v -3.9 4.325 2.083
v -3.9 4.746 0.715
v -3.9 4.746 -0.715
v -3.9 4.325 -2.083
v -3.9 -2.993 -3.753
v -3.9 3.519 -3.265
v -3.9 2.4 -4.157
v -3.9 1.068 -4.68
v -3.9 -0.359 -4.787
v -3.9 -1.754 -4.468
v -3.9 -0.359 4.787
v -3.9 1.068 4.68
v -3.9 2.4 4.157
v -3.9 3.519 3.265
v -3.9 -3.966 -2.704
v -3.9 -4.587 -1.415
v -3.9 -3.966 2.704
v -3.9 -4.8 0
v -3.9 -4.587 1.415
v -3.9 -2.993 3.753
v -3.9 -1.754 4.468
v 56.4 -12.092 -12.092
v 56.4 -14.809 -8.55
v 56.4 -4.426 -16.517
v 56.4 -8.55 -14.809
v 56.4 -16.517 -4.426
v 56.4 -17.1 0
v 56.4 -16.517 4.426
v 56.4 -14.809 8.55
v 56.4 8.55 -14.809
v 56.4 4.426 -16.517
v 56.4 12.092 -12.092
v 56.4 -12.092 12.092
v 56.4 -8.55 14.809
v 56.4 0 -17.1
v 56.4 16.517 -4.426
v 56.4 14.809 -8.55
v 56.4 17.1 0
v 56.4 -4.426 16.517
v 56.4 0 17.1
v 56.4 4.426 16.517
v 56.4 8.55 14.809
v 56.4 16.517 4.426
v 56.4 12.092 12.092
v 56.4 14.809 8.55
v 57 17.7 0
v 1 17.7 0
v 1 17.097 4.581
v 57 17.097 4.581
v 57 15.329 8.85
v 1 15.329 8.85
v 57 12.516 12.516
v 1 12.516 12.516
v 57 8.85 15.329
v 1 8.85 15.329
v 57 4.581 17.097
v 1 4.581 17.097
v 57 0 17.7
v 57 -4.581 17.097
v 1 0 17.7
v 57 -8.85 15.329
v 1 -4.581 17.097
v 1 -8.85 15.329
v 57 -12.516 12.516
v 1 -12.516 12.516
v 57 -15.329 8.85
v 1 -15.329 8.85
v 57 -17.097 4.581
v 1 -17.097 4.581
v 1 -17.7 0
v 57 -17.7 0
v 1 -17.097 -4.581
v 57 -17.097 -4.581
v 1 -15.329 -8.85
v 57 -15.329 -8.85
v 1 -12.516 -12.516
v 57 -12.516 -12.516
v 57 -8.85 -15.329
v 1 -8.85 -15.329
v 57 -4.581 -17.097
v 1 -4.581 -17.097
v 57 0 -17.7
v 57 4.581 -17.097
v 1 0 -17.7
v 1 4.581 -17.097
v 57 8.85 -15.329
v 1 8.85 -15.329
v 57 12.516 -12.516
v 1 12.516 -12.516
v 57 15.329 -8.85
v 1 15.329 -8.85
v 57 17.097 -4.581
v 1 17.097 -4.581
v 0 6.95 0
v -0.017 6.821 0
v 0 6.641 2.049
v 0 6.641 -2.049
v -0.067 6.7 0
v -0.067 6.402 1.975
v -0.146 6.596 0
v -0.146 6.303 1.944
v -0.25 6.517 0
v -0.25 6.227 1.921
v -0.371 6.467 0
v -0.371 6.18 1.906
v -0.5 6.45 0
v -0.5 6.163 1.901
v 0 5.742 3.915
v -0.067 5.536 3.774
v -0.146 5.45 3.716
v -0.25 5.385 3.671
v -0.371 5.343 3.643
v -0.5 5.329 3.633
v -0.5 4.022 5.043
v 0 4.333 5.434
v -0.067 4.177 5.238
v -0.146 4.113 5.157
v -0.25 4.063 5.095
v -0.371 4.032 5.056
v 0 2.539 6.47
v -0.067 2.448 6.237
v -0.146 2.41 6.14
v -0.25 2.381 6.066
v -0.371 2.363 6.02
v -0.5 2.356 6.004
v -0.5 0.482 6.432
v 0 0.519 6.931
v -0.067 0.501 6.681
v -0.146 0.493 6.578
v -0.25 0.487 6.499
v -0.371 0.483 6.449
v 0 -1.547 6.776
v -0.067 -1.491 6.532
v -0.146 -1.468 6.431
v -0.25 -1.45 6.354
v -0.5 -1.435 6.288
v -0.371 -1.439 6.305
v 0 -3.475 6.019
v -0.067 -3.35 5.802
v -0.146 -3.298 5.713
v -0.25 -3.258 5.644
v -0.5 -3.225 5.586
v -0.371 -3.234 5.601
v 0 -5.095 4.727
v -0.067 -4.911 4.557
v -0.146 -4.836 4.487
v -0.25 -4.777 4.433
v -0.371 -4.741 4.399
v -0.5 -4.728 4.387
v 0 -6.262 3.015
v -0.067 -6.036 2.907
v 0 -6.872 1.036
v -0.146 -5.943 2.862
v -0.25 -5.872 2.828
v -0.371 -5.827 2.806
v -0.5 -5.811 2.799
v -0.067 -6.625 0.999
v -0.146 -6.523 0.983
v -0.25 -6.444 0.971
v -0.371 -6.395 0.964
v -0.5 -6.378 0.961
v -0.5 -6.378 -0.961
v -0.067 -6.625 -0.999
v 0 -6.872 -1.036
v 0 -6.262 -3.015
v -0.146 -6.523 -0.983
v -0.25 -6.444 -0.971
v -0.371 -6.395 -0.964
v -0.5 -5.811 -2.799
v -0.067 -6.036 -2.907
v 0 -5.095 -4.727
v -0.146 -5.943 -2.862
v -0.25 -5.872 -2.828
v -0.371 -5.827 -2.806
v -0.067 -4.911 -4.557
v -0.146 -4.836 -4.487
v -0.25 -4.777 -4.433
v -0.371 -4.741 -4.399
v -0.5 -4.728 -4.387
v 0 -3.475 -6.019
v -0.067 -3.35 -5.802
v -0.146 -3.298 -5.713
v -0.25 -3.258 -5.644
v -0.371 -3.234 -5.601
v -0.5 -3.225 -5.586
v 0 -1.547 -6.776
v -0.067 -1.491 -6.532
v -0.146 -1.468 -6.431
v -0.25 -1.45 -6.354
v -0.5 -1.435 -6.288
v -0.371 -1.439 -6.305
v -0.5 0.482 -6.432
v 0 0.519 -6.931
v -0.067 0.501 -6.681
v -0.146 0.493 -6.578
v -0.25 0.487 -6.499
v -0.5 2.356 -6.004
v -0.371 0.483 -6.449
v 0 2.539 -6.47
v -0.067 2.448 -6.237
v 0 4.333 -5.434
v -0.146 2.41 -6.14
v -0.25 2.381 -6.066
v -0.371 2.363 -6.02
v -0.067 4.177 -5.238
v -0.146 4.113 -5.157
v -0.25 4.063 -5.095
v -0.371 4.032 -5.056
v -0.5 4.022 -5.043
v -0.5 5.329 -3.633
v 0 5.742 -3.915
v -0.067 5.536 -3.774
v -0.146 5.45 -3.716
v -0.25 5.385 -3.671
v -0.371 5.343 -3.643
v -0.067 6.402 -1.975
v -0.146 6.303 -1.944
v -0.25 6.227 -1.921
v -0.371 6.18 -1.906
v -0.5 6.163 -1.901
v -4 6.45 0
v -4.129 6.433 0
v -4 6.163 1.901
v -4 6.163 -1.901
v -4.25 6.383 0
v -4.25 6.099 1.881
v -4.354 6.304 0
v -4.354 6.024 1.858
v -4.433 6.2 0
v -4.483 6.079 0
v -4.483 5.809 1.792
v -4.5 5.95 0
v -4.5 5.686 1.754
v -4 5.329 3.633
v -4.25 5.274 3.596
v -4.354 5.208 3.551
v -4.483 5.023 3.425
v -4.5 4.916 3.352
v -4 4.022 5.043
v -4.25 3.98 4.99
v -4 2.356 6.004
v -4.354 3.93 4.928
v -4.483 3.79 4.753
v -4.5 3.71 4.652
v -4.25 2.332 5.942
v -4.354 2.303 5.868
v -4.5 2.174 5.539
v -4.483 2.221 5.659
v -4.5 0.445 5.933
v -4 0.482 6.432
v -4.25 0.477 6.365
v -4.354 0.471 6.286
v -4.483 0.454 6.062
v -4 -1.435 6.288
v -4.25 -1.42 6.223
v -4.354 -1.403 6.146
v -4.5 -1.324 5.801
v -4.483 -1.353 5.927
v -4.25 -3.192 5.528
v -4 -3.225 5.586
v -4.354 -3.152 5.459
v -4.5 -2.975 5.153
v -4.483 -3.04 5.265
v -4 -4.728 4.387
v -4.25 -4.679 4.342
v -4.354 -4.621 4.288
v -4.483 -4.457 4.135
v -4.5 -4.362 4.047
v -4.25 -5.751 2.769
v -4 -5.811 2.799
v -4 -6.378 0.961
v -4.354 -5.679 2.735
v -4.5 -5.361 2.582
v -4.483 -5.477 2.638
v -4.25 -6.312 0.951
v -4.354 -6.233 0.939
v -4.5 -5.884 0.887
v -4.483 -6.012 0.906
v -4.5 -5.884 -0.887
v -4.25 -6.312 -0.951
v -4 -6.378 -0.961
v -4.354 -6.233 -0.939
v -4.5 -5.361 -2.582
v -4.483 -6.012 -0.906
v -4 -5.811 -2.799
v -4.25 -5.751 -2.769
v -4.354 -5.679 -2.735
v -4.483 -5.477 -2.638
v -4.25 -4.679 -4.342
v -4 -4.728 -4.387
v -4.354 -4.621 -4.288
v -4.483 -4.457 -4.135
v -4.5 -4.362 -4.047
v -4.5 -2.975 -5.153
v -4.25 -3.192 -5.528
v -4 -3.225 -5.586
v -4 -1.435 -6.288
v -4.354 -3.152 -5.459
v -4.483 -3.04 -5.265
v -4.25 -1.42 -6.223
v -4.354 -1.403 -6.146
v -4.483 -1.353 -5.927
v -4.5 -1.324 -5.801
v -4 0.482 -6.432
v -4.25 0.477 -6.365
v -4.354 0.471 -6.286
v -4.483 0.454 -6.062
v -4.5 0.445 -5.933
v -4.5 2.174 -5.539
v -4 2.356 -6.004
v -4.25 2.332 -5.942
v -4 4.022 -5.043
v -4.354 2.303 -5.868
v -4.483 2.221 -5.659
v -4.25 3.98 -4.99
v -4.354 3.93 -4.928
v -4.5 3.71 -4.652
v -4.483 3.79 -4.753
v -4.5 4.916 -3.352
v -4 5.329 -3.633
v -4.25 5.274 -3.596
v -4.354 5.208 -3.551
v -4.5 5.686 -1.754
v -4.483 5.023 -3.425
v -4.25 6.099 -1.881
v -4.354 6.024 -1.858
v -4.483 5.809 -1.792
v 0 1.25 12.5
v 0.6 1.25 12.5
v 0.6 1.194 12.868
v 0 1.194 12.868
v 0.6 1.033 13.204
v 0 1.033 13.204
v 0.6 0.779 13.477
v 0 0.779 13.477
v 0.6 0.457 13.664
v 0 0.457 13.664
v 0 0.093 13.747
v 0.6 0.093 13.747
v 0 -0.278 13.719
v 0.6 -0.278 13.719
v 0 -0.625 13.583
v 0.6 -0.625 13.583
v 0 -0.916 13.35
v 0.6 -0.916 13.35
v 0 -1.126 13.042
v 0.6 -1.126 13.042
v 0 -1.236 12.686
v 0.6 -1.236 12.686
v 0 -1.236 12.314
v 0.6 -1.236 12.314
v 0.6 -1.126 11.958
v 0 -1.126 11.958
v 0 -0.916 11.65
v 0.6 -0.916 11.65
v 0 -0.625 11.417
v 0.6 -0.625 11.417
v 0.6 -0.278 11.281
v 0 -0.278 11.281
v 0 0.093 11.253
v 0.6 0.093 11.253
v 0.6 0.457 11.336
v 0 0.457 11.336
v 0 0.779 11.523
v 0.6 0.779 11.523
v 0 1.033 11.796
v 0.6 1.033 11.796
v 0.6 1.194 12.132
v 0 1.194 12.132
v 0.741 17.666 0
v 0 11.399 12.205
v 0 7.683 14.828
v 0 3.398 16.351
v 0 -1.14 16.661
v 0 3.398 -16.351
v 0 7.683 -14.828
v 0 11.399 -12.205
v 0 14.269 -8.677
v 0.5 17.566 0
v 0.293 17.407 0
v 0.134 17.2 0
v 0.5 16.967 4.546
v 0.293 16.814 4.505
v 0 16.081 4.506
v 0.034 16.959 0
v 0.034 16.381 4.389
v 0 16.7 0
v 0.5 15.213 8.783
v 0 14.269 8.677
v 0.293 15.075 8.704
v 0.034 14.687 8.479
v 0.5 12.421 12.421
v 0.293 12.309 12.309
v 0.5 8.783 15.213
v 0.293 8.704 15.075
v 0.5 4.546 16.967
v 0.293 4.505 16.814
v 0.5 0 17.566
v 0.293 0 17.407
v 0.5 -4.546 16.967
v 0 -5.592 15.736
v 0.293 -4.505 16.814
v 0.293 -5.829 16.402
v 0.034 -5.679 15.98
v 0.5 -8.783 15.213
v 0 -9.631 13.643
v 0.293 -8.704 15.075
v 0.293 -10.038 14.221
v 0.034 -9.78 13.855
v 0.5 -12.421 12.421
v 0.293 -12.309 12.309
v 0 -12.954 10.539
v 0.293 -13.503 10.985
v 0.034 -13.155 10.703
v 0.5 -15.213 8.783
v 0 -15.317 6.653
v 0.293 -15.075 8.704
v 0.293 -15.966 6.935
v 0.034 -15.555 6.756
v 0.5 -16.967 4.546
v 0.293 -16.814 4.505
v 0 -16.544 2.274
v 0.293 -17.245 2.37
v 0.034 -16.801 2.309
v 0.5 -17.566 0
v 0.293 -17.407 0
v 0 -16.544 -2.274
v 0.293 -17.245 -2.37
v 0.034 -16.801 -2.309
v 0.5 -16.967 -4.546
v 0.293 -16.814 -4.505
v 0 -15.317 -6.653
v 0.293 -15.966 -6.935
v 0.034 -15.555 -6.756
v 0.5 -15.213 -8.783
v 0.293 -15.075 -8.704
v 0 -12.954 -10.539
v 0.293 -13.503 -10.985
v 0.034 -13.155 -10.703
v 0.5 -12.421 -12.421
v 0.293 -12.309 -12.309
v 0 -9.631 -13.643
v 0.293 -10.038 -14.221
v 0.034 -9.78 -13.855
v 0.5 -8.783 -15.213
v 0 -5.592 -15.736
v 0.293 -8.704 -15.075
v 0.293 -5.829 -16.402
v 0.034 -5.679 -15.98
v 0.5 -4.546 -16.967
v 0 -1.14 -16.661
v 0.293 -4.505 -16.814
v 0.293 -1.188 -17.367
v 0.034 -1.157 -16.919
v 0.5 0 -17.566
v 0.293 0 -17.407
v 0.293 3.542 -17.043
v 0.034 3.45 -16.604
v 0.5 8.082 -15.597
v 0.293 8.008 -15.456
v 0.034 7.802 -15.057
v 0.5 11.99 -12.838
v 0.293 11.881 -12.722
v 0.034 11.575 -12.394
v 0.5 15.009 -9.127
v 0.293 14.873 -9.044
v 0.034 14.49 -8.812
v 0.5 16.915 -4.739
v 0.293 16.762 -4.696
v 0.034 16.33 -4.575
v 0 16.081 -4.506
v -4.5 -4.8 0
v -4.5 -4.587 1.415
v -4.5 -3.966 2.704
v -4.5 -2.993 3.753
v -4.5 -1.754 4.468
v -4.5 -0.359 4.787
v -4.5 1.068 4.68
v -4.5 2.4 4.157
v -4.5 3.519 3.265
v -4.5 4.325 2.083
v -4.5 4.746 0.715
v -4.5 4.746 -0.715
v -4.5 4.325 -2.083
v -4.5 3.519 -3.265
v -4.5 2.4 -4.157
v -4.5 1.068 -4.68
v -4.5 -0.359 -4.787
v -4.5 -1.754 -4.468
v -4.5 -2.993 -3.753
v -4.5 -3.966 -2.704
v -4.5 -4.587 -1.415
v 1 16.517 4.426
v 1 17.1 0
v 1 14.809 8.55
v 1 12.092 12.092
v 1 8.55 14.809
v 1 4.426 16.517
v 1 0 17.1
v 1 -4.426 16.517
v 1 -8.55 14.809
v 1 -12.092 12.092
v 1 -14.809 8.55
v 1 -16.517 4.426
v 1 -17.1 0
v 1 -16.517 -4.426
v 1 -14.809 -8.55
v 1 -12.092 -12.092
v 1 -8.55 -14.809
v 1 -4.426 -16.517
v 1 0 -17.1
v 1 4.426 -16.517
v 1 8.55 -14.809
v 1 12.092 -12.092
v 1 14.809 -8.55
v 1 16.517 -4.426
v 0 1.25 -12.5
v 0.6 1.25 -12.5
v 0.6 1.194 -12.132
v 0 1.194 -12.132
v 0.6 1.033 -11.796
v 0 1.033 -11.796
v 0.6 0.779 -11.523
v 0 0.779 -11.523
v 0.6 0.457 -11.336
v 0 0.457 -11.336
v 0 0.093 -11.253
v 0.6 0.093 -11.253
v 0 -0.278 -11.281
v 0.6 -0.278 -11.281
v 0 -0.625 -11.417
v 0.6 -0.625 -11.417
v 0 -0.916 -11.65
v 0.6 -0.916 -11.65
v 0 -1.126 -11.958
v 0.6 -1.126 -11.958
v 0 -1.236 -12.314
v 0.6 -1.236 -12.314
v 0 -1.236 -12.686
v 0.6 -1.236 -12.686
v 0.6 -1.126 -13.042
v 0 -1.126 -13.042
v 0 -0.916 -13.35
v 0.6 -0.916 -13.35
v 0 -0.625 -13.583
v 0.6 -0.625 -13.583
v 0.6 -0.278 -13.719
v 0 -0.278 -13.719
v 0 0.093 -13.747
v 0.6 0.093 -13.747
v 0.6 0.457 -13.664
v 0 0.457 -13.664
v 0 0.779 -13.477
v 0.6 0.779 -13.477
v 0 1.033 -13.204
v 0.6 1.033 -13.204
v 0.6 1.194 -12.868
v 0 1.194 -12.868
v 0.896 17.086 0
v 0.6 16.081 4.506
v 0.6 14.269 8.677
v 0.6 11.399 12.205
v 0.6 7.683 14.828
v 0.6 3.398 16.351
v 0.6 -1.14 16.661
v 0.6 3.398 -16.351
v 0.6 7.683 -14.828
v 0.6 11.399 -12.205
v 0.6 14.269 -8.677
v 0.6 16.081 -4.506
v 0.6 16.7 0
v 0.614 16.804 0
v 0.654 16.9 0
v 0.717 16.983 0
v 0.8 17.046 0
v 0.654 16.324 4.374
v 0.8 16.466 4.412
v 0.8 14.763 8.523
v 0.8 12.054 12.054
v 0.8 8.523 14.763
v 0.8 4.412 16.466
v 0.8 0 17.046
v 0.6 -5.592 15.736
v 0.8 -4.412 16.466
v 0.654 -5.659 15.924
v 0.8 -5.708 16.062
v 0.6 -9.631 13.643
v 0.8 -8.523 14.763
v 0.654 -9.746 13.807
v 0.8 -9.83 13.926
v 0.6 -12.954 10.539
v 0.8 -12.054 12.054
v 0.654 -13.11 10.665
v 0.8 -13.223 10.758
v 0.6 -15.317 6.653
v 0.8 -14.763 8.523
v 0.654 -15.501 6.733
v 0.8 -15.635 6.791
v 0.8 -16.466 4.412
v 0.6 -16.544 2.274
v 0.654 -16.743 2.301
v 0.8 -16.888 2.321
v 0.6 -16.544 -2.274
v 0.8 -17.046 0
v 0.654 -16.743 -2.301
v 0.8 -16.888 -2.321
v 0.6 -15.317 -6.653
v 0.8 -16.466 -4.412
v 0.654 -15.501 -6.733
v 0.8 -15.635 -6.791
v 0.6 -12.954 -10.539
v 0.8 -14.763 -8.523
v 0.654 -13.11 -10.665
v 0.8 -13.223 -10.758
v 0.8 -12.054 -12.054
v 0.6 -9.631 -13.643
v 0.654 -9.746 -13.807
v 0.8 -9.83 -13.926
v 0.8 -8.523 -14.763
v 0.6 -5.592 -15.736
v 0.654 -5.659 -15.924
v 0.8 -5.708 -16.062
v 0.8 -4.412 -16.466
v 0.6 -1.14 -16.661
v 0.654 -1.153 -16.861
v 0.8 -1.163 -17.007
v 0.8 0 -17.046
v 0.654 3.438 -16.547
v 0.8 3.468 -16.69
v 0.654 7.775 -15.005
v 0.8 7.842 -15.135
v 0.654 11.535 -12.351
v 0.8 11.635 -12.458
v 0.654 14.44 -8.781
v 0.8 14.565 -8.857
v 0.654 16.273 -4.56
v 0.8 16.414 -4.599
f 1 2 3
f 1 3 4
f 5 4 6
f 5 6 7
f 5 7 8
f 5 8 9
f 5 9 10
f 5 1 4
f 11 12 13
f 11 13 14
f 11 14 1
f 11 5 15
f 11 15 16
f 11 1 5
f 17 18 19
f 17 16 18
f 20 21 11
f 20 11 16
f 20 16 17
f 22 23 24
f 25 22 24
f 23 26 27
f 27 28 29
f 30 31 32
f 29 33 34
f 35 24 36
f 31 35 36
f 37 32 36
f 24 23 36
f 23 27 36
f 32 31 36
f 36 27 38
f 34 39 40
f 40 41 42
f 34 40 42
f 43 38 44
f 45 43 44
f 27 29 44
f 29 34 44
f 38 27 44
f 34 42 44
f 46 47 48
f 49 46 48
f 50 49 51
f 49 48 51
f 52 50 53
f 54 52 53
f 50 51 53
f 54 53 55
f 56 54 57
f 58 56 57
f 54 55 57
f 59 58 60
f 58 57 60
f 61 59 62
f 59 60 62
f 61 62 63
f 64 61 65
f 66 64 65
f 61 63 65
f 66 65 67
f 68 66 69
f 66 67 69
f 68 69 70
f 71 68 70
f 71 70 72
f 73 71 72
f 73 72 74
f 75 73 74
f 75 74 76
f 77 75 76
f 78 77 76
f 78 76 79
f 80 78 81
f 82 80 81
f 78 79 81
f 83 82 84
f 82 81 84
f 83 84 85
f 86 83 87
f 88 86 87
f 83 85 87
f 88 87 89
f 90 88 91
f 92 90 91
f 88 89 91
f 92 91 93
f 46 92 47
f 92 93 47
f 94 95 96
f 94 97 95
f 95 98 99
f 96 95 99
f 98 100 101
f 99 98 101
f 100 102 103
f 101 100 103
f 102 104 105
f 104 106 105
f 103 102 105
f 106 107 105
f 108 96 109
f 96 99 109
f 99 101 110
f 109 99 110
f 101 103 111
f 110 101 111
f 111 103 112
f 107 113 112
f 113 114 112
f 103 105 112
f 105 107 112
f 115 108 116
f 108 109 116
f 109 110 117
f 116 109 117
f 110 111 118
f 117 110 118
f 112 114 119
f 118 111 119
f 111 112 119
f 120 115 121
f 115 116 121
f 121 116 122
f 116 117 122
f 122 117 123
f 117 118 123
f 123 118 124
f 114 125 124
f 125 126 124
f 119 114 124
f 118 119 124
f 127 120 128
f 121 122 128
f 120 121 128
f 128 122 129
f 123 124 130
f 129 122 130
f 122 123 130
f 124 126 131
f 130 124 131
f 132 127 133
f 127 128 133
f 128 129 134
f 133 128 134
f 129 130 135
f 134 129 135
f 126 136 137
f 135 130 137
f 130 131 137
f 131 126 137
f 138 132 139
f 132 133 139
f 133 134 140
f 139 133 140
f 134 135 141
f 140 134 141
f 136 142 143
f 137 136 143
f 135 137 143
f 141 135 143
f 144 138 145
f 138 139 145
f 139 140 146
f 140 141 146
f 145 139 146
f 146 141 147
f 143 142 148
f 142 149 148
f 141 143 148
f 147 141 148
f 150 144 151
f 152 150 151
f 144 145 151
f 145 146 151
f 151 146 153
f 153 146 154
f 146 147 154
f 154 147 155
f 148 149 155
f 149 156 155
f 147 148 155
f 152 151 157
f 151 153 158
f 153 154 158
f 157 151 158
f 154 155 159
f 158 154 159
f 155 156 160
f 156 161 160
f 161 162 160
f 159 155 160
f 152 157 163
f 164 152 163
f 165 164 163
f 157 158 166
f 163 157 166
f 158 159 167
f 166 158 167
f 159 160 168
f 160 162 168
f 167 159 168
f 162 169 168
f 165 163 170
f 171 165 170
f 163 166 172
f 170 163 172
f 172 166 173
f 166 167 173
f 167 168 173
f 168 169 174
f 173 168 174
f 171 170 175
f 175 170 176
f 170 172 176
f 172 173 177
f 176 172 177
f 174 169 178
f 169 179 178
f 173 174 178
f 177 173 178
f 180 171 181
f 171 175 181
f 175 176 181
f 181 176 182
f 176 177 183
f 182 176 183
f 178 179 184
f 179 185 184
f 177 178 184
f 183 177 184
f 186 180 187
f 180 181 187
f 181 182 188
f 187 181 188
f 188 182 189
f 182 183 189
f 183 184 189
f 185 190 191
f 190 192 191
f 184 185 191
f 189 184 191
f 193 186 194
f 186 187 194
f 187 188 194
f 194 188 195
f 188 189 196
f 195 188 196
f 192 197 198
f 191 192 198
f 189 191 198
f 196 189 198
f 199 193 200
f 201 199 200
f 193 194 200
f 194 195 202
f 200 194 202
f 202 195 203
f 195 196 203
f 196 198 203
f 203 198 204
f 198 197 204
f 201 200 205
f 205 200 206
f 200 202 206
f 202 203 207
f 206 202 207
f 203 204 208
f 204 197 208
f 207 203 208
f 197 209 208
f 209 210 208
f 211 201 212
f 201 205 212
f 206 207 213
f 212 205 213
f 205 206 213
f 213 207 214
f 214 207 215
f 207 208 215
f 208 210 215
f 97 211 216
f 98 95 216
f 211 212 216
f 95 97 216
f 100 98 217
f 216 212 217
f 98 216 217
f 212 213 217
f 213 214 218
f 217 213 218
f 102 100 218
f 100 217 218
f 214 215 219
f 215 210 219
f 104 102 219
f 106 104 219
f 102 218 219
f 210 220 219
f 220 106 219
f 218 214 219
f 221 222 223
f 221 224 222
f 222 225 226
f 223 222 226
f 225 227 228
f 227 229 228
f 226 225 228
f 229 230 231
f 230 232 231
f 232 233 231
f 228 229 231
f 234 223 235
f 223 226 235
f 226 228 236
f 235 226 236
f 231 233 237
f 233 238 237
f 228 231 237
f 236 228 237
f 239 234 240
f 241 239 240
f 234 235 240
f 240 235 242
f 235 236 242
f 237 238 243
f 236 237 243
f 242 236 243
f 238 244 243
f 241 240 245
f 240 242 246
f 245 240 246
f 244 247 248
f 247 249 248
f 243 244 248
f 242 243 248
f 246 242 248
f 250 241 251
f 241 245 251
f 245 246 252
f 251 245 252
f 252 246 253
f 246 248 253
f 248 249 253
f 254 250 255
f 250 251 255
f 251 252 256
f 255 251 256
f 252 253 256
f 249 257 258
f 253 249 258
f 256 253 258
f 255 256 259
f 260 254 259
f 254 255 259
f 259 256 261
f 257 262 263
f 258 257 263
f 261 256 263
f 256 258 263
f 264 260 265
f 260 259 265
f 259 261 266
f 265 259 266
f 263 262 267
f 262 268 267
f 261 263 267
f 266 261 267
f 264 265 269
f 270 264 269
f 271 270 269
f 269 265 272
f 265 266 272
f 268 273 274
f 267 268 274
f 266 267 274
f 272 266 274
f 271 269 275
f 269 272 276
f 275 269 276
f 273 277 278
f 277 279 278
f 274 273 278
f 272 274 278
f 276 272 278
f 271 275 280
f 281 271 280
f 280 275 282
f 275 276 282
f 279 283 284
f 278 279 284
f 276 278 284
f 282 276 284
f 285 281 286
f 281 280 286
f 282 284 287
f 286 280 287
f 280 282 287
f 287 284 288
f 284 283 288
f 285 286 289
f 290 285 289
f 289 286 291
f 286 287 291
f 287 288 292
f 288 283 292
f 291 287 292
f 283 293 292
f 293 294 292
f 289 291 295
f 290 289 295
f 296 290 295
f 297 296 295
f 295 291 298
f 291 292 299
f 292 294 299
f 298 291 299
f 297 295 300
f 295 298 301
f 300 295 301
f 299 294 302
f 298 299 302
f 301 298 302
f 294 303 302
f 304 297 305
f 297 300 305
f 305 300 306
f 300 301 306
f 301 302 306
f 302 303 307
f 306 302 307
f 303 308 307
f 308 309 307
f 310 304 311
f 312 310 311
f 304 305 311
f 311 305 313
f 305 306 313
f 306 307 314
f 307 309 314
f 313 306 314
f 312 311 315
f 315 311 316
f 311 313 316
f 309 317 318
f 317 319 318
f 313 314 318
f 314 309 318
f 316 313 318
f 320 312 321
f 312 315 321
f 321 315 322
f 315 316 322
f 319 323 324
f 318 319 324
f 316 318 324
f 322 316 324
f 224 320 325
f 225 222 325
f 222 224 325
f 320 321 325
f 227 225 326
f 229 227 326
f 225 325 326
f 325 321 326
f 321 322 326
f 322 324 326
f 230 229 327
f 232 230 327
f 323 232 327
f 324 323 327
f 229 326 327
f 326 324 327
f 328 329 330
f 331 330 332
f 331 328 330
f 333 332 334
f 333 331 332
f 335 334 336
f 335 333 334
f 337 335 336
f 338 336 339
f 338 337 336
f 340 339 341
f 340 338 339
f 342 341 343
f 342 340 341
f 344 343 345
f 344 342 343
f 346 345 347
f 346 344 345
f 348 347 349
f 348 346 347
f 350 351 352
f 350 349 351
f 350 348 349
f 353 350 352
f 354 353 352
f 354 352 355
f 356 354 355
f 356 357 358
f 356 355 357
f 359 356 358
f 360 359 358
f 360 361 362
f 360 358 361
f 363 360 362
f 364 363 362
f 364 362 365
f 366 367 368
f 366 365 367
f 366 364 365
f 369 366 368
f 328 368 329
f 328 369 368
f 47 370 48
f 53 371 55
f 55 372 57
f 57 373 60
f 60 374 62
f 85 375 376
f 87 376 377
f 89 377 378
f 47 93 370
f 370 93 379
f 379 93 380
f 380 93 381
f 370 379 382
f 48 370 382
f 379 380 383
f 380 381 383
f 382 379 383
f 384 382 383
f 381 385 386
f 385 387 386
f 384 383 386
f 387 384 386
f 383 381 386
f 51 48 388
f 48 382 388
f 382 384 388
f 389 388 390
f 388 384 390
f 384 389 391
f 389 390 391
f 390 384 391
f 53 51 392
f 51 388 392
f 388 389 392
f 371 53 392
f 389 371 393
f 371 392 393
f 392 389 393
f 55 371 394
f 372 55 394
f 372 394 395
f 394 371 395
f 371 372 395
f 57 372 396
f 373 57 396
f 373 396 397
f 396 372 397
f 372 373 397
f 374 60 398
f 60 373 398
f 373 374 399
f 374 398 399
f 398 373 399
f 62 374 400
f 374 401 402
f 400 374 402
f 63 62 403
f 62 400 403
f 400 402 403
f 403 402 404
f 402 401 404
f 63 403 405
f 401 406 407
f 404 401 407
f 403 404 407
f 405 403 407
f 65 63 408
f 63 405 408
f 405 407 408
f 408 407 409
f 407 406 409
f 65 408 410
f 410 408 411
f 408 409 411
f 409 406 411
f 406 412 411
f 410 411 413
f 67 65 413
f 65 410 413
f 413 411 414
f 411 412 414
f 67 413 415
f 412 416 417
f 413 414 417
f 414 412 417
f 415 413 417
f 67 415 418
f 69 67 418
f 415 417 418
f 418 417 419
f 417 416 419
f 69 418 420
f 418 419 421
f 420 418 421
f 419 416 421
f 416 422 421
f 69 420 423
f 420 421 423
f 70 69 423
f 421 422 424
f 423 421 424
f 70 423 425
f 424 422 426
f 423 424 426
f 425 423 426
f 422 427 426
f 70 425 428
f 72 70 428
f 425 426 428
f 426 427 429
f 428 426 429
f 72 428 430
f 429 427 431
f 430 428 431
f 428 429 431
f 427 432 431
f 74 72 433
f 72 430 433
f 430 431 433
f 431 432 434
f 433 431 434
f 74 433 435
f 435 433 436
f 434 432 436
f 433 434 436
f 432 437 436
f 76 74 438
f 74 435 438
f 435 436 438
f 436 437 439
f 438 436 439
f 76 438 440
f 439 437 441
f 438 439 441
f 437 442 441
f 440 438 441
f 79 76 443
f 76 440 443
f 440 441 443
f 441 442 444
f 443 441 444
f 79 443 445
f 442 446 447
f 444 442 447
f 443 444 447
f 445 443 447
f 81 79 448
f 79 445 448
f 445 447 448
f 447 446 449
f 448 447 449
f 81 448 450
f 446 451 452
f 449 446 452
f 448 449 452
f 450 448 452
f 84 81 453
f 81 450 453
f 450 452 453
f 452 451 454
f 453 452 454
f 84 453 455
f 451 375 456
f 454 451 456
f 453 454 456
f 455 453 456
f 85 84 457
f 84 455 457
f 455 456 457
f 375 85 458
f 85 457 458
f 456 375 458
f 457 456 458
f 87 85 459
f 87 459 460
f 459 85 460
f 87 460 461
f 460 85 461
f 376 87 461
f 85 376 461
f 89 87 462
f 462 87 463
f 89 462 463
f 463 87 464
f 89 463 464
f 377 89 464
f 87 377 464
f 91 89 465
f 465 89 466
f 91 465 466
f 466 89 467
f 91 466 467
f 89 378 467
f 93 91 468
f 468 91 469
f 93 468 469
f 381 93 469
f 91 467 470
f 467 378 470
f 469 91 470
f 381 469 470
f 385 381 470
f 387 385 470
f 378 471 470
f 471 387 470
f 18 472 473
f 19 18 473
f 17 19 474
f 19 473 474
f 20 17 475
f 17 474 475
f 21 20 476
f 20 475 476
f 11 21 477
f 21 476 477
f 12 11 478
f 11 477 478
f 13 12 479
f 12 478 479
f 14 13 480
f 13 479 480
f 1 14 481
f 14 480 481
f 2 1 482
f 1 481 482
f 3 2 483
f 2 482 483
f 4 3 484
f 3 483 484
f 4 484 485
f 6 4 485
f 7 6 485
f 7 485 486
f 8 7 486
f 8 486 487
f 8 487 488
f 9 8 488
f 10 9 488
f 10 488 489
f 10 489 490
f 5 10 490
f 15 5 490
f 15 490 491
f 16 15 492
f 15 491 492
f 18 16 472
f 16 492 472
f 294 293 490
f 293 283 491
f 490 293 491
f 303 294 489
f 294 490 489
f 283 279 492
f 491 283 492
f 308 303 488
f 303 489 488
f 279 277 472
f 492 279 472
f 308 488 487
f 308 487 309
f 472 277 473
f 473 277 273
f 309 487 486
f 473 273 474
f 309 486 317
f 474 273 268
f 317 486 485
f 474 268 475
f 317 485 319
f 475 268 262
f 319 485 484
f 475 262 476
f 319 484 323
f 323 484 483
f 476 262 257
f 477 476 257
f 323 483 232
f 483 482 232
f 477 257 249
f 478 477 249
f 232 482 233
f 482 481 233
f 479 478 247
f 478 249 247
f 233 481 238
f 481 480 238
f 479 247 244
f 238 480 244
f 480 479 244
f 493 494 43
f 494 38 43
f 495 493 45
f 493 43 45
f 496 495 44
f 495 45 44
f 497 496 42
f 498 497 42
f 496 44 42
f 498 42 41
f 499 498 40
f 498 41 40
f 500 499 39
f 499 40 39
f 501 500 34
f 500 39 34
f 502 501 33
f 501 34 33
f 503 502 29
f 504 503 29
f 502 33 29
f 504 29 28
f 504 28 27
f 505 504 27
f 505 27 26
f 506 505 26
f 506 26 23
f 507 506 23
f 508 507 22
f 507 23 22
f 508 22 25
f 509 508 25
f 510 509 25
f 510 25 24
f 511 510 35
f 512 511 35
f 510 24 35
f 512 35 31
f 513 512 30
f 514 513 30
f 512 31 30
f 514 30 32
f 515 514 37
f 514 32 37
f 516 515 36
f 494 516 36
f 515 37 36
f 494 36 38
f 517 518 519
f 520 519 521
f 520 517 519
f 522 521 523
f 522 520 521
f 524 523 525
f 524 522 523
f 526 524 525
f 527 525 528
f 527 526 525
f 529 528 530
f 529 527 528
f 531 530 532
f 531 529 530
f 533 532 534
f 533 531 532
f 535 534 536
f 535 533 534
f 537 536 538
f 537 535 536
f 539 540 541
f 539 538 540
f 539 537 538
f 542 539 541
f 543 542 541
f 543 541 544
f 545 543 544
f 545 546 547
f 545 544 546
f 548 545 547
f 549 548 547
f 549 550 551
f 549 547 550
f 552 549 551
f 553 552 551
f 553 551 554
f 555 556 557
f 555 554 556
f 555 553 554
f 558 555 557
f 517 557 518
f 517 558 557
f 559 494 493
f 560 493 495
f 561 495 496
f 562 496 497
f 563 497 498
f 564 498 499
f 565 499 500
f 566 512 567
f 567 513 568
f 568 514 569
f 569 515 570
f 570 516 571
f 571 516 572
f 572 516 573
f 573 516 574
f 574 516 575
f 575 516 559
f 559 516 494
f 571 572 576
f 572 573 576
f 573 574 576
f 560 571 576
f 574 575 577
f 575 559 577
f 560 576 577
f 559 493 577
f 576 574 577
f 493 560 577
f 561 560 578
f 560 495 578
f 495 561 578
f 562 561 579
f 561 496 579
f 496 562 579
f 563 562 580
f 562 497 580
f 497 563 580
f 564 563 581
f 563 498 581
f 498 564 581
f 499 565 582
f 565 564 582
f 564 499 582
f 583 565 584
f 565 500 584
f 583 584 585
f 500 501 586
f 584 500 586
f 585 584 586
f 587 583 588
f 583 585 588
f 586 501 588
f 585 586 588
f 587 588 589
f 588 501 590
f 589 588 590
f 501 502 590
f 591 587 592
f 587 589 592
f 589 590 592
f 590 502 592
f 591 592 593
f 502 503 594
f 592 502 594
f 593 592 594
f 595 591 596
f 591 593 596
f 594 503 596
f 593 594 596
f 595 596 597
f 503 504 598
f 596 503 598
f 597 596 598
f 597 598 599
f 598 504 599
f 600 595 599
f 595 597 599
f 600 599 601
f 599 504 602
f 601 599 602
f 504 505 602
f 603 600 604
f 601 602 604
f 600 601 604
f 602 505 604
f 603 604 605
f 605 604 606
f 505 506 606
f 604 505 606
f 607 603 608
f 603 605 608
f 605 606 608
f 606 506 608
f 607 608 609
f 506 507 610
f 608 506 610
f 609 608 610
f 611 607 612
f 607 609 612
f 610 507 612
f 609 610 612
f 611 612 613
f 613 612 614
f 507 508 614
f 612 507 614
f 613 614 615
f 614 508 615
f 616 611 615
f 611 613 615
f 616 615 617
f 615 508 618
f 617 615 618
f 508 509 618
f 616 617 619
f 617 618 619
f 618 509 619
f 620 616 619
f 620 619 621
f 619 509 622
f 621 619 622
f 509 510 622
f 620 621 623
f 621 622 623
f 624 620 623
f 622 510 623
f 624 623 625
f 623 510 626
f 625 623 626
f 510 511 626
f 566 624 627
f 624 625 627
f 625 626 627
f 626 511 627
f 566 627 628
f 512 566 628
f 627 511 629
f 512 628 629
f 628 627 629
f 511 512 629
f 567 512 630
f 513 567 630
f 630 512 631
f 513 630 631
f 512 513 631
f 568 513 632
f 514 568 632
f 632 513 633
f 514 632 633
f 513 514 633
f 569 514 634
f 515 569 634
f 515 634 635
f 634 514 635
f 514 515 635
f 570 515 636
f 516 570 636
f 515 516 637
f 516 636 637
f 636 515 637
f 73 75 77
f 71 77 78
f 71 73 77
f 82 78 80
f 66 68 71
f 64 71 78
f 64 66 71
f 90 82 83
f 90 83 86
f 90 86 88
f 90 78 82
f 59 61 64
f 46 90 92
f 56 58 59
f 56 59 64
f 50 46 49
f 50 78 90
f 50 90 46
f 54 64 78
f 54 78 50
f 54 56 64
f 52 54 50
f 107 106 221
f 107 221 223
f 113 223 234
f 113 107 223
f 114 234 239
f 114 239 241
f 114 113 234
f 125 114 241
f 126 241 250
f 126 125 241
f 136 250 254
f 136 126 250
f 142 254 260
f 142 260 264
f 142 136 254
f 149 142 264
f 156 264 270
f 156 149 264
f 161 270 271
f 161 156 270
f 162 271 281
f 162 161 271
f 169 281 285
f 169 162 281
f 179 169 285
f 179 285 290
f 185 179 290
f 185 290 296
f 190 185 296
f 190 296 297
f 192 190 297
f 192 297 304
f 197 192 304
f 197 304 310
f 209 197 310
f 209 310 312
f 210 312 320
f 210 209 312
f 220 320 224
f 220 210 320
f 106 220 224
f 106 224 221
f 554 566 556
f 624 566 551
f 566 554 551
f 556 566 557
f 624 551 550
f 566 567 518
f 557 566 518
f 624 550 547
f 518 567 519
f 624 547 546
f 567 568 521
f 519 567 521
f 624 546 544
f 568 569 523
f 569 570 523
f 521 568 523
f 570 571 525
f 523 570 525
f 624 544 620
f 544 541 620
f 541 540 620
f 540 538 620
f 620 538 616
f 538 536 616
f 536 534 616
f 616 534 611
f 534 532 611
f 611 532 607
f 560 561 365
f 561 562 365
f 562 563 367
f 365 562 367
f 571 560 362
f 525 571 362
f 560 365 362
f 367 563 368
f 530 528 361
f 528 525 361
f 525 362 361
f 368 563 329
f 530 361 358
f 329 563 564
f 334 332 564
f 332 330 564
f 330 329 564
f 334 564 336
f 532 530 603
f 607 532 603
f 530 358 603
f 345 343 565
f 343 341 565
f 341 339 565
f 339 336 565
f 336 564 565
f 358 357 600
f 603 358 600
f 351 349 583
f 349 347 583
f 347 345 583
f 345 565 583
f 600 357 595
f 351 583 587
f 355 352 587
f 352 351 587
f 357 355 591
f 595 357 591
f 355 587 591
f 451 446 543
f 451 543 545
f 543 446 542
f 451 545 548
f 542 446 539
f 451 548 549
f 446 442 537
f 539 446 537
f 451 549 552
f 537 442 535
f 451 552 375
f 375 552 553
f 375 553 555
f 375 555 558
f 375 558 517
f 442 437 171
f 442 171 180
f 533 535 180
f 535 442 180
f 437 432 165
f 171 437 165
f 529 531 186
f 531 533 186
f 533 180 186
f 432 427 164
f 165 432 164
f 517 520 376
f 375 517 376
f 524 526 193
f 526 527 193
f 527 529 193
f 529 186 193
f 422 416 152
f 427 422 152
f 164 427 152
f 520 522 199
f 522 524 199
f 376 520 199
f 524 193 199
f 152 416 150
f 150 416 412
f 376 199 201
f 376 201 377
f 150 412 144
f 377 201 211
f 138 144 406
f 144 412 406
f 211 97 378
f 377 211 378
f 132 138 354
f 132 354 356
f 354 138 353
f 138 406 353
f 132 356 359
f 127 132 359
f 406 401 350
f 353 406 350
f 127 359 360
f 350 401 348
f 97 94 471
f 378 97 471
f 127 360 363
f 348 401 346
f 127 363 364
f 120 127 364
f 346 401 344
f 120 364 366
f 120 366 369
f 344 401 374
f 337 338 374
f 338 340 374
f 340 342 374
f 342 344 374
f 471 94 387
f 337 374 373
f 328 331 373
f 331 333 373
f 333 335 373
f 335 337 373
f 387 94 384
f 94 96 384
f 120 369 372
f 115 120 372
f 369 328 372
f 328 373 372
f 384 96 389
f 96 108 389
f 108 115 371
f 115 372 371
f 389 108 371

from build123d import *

# Parameters (mm, degrees)
F0_W      = 0.6
F0_H      = 17.1
F2_R      = 0.4
F3_R      = 1
F4_R      = 6.45
F5_DEPTH  = 4.5
F6_R      = 0.5
F7_R      = 4.8
F8_DEPTH  = 0.6
F4_R_2    = 1.25
F9_DEPTH  = 25
F10_R     = 17.1
F11_DEPTH = 0.6


with BuildPart() as f1:
    # F0 (on Top) → F1 (revolve)
    with BuildSketch(Plane.XY):
        with Locations((0.3, 8.55)):
            Rectangle(F0_W, F0_H)
        Polygon((0, 17.7), (0, 17.1), (0.6, 17.1), (57, 17.1), (57, 17.7), align=None)
    revolve(axis=Axis((0.3, 0, 0), (1, 0, 0)))

    # F2
    f2_edges = [f1.edges().sort_by_distance(p)[0] for p in [
        (0.6, -17.1, 0),
    ]]
    fillet(f2_edges, radius=F2_R)

    # F3
    f3_edges = [f1.edges().sort_by_distance(p)[0] for p in [
        (0, -17.7, 0),
    ]]
    fillet(f3_edges, radius=F3_R)

    # F4 (on Right) → F5 (join)
    with BuildSketch(Plane.YZ):
        Circle(F4_R)
    extrude(amount=-F5_DEPTH)

    # F6
    f6_edges = [f1.edges().sort_by_distance(p)[0] for p in [
        (0, -6.45, 0),
        (-4.5, -6.45, 0),
    ]]
    fillet(f6_edges, radius=F6_R)

    # F7 (on face) → F8 (cut)
    with BuildSketch(Plane(origin=(-4.5, 0, 0), x_dir=(0, -1, 0), z_dir=(-1, 0, 0))):
        Circle(F7_R)
    extrude(amount=-F8_DEPTH, mode=Mode.SUBTRACT)

    # F4 (on Right) → F9 (cut)
    with BuildSketch(Plane.YZ):
        with Locations((0, -12.5)):
            Circle(F4_R_2)
        with Locations((0, 12.5)):
            Circle(F4_R_2)
    extrude(amount=F9_DEPTH, mode=Mode.SUBTRACT)

    # F10 (on face) → F11 (join)
    with BuildSketch(Plane.YZ.offset(57)):
        Circle(F10_R)
    extrude(amount=-F11_DEPTH)


solid = f1.part
